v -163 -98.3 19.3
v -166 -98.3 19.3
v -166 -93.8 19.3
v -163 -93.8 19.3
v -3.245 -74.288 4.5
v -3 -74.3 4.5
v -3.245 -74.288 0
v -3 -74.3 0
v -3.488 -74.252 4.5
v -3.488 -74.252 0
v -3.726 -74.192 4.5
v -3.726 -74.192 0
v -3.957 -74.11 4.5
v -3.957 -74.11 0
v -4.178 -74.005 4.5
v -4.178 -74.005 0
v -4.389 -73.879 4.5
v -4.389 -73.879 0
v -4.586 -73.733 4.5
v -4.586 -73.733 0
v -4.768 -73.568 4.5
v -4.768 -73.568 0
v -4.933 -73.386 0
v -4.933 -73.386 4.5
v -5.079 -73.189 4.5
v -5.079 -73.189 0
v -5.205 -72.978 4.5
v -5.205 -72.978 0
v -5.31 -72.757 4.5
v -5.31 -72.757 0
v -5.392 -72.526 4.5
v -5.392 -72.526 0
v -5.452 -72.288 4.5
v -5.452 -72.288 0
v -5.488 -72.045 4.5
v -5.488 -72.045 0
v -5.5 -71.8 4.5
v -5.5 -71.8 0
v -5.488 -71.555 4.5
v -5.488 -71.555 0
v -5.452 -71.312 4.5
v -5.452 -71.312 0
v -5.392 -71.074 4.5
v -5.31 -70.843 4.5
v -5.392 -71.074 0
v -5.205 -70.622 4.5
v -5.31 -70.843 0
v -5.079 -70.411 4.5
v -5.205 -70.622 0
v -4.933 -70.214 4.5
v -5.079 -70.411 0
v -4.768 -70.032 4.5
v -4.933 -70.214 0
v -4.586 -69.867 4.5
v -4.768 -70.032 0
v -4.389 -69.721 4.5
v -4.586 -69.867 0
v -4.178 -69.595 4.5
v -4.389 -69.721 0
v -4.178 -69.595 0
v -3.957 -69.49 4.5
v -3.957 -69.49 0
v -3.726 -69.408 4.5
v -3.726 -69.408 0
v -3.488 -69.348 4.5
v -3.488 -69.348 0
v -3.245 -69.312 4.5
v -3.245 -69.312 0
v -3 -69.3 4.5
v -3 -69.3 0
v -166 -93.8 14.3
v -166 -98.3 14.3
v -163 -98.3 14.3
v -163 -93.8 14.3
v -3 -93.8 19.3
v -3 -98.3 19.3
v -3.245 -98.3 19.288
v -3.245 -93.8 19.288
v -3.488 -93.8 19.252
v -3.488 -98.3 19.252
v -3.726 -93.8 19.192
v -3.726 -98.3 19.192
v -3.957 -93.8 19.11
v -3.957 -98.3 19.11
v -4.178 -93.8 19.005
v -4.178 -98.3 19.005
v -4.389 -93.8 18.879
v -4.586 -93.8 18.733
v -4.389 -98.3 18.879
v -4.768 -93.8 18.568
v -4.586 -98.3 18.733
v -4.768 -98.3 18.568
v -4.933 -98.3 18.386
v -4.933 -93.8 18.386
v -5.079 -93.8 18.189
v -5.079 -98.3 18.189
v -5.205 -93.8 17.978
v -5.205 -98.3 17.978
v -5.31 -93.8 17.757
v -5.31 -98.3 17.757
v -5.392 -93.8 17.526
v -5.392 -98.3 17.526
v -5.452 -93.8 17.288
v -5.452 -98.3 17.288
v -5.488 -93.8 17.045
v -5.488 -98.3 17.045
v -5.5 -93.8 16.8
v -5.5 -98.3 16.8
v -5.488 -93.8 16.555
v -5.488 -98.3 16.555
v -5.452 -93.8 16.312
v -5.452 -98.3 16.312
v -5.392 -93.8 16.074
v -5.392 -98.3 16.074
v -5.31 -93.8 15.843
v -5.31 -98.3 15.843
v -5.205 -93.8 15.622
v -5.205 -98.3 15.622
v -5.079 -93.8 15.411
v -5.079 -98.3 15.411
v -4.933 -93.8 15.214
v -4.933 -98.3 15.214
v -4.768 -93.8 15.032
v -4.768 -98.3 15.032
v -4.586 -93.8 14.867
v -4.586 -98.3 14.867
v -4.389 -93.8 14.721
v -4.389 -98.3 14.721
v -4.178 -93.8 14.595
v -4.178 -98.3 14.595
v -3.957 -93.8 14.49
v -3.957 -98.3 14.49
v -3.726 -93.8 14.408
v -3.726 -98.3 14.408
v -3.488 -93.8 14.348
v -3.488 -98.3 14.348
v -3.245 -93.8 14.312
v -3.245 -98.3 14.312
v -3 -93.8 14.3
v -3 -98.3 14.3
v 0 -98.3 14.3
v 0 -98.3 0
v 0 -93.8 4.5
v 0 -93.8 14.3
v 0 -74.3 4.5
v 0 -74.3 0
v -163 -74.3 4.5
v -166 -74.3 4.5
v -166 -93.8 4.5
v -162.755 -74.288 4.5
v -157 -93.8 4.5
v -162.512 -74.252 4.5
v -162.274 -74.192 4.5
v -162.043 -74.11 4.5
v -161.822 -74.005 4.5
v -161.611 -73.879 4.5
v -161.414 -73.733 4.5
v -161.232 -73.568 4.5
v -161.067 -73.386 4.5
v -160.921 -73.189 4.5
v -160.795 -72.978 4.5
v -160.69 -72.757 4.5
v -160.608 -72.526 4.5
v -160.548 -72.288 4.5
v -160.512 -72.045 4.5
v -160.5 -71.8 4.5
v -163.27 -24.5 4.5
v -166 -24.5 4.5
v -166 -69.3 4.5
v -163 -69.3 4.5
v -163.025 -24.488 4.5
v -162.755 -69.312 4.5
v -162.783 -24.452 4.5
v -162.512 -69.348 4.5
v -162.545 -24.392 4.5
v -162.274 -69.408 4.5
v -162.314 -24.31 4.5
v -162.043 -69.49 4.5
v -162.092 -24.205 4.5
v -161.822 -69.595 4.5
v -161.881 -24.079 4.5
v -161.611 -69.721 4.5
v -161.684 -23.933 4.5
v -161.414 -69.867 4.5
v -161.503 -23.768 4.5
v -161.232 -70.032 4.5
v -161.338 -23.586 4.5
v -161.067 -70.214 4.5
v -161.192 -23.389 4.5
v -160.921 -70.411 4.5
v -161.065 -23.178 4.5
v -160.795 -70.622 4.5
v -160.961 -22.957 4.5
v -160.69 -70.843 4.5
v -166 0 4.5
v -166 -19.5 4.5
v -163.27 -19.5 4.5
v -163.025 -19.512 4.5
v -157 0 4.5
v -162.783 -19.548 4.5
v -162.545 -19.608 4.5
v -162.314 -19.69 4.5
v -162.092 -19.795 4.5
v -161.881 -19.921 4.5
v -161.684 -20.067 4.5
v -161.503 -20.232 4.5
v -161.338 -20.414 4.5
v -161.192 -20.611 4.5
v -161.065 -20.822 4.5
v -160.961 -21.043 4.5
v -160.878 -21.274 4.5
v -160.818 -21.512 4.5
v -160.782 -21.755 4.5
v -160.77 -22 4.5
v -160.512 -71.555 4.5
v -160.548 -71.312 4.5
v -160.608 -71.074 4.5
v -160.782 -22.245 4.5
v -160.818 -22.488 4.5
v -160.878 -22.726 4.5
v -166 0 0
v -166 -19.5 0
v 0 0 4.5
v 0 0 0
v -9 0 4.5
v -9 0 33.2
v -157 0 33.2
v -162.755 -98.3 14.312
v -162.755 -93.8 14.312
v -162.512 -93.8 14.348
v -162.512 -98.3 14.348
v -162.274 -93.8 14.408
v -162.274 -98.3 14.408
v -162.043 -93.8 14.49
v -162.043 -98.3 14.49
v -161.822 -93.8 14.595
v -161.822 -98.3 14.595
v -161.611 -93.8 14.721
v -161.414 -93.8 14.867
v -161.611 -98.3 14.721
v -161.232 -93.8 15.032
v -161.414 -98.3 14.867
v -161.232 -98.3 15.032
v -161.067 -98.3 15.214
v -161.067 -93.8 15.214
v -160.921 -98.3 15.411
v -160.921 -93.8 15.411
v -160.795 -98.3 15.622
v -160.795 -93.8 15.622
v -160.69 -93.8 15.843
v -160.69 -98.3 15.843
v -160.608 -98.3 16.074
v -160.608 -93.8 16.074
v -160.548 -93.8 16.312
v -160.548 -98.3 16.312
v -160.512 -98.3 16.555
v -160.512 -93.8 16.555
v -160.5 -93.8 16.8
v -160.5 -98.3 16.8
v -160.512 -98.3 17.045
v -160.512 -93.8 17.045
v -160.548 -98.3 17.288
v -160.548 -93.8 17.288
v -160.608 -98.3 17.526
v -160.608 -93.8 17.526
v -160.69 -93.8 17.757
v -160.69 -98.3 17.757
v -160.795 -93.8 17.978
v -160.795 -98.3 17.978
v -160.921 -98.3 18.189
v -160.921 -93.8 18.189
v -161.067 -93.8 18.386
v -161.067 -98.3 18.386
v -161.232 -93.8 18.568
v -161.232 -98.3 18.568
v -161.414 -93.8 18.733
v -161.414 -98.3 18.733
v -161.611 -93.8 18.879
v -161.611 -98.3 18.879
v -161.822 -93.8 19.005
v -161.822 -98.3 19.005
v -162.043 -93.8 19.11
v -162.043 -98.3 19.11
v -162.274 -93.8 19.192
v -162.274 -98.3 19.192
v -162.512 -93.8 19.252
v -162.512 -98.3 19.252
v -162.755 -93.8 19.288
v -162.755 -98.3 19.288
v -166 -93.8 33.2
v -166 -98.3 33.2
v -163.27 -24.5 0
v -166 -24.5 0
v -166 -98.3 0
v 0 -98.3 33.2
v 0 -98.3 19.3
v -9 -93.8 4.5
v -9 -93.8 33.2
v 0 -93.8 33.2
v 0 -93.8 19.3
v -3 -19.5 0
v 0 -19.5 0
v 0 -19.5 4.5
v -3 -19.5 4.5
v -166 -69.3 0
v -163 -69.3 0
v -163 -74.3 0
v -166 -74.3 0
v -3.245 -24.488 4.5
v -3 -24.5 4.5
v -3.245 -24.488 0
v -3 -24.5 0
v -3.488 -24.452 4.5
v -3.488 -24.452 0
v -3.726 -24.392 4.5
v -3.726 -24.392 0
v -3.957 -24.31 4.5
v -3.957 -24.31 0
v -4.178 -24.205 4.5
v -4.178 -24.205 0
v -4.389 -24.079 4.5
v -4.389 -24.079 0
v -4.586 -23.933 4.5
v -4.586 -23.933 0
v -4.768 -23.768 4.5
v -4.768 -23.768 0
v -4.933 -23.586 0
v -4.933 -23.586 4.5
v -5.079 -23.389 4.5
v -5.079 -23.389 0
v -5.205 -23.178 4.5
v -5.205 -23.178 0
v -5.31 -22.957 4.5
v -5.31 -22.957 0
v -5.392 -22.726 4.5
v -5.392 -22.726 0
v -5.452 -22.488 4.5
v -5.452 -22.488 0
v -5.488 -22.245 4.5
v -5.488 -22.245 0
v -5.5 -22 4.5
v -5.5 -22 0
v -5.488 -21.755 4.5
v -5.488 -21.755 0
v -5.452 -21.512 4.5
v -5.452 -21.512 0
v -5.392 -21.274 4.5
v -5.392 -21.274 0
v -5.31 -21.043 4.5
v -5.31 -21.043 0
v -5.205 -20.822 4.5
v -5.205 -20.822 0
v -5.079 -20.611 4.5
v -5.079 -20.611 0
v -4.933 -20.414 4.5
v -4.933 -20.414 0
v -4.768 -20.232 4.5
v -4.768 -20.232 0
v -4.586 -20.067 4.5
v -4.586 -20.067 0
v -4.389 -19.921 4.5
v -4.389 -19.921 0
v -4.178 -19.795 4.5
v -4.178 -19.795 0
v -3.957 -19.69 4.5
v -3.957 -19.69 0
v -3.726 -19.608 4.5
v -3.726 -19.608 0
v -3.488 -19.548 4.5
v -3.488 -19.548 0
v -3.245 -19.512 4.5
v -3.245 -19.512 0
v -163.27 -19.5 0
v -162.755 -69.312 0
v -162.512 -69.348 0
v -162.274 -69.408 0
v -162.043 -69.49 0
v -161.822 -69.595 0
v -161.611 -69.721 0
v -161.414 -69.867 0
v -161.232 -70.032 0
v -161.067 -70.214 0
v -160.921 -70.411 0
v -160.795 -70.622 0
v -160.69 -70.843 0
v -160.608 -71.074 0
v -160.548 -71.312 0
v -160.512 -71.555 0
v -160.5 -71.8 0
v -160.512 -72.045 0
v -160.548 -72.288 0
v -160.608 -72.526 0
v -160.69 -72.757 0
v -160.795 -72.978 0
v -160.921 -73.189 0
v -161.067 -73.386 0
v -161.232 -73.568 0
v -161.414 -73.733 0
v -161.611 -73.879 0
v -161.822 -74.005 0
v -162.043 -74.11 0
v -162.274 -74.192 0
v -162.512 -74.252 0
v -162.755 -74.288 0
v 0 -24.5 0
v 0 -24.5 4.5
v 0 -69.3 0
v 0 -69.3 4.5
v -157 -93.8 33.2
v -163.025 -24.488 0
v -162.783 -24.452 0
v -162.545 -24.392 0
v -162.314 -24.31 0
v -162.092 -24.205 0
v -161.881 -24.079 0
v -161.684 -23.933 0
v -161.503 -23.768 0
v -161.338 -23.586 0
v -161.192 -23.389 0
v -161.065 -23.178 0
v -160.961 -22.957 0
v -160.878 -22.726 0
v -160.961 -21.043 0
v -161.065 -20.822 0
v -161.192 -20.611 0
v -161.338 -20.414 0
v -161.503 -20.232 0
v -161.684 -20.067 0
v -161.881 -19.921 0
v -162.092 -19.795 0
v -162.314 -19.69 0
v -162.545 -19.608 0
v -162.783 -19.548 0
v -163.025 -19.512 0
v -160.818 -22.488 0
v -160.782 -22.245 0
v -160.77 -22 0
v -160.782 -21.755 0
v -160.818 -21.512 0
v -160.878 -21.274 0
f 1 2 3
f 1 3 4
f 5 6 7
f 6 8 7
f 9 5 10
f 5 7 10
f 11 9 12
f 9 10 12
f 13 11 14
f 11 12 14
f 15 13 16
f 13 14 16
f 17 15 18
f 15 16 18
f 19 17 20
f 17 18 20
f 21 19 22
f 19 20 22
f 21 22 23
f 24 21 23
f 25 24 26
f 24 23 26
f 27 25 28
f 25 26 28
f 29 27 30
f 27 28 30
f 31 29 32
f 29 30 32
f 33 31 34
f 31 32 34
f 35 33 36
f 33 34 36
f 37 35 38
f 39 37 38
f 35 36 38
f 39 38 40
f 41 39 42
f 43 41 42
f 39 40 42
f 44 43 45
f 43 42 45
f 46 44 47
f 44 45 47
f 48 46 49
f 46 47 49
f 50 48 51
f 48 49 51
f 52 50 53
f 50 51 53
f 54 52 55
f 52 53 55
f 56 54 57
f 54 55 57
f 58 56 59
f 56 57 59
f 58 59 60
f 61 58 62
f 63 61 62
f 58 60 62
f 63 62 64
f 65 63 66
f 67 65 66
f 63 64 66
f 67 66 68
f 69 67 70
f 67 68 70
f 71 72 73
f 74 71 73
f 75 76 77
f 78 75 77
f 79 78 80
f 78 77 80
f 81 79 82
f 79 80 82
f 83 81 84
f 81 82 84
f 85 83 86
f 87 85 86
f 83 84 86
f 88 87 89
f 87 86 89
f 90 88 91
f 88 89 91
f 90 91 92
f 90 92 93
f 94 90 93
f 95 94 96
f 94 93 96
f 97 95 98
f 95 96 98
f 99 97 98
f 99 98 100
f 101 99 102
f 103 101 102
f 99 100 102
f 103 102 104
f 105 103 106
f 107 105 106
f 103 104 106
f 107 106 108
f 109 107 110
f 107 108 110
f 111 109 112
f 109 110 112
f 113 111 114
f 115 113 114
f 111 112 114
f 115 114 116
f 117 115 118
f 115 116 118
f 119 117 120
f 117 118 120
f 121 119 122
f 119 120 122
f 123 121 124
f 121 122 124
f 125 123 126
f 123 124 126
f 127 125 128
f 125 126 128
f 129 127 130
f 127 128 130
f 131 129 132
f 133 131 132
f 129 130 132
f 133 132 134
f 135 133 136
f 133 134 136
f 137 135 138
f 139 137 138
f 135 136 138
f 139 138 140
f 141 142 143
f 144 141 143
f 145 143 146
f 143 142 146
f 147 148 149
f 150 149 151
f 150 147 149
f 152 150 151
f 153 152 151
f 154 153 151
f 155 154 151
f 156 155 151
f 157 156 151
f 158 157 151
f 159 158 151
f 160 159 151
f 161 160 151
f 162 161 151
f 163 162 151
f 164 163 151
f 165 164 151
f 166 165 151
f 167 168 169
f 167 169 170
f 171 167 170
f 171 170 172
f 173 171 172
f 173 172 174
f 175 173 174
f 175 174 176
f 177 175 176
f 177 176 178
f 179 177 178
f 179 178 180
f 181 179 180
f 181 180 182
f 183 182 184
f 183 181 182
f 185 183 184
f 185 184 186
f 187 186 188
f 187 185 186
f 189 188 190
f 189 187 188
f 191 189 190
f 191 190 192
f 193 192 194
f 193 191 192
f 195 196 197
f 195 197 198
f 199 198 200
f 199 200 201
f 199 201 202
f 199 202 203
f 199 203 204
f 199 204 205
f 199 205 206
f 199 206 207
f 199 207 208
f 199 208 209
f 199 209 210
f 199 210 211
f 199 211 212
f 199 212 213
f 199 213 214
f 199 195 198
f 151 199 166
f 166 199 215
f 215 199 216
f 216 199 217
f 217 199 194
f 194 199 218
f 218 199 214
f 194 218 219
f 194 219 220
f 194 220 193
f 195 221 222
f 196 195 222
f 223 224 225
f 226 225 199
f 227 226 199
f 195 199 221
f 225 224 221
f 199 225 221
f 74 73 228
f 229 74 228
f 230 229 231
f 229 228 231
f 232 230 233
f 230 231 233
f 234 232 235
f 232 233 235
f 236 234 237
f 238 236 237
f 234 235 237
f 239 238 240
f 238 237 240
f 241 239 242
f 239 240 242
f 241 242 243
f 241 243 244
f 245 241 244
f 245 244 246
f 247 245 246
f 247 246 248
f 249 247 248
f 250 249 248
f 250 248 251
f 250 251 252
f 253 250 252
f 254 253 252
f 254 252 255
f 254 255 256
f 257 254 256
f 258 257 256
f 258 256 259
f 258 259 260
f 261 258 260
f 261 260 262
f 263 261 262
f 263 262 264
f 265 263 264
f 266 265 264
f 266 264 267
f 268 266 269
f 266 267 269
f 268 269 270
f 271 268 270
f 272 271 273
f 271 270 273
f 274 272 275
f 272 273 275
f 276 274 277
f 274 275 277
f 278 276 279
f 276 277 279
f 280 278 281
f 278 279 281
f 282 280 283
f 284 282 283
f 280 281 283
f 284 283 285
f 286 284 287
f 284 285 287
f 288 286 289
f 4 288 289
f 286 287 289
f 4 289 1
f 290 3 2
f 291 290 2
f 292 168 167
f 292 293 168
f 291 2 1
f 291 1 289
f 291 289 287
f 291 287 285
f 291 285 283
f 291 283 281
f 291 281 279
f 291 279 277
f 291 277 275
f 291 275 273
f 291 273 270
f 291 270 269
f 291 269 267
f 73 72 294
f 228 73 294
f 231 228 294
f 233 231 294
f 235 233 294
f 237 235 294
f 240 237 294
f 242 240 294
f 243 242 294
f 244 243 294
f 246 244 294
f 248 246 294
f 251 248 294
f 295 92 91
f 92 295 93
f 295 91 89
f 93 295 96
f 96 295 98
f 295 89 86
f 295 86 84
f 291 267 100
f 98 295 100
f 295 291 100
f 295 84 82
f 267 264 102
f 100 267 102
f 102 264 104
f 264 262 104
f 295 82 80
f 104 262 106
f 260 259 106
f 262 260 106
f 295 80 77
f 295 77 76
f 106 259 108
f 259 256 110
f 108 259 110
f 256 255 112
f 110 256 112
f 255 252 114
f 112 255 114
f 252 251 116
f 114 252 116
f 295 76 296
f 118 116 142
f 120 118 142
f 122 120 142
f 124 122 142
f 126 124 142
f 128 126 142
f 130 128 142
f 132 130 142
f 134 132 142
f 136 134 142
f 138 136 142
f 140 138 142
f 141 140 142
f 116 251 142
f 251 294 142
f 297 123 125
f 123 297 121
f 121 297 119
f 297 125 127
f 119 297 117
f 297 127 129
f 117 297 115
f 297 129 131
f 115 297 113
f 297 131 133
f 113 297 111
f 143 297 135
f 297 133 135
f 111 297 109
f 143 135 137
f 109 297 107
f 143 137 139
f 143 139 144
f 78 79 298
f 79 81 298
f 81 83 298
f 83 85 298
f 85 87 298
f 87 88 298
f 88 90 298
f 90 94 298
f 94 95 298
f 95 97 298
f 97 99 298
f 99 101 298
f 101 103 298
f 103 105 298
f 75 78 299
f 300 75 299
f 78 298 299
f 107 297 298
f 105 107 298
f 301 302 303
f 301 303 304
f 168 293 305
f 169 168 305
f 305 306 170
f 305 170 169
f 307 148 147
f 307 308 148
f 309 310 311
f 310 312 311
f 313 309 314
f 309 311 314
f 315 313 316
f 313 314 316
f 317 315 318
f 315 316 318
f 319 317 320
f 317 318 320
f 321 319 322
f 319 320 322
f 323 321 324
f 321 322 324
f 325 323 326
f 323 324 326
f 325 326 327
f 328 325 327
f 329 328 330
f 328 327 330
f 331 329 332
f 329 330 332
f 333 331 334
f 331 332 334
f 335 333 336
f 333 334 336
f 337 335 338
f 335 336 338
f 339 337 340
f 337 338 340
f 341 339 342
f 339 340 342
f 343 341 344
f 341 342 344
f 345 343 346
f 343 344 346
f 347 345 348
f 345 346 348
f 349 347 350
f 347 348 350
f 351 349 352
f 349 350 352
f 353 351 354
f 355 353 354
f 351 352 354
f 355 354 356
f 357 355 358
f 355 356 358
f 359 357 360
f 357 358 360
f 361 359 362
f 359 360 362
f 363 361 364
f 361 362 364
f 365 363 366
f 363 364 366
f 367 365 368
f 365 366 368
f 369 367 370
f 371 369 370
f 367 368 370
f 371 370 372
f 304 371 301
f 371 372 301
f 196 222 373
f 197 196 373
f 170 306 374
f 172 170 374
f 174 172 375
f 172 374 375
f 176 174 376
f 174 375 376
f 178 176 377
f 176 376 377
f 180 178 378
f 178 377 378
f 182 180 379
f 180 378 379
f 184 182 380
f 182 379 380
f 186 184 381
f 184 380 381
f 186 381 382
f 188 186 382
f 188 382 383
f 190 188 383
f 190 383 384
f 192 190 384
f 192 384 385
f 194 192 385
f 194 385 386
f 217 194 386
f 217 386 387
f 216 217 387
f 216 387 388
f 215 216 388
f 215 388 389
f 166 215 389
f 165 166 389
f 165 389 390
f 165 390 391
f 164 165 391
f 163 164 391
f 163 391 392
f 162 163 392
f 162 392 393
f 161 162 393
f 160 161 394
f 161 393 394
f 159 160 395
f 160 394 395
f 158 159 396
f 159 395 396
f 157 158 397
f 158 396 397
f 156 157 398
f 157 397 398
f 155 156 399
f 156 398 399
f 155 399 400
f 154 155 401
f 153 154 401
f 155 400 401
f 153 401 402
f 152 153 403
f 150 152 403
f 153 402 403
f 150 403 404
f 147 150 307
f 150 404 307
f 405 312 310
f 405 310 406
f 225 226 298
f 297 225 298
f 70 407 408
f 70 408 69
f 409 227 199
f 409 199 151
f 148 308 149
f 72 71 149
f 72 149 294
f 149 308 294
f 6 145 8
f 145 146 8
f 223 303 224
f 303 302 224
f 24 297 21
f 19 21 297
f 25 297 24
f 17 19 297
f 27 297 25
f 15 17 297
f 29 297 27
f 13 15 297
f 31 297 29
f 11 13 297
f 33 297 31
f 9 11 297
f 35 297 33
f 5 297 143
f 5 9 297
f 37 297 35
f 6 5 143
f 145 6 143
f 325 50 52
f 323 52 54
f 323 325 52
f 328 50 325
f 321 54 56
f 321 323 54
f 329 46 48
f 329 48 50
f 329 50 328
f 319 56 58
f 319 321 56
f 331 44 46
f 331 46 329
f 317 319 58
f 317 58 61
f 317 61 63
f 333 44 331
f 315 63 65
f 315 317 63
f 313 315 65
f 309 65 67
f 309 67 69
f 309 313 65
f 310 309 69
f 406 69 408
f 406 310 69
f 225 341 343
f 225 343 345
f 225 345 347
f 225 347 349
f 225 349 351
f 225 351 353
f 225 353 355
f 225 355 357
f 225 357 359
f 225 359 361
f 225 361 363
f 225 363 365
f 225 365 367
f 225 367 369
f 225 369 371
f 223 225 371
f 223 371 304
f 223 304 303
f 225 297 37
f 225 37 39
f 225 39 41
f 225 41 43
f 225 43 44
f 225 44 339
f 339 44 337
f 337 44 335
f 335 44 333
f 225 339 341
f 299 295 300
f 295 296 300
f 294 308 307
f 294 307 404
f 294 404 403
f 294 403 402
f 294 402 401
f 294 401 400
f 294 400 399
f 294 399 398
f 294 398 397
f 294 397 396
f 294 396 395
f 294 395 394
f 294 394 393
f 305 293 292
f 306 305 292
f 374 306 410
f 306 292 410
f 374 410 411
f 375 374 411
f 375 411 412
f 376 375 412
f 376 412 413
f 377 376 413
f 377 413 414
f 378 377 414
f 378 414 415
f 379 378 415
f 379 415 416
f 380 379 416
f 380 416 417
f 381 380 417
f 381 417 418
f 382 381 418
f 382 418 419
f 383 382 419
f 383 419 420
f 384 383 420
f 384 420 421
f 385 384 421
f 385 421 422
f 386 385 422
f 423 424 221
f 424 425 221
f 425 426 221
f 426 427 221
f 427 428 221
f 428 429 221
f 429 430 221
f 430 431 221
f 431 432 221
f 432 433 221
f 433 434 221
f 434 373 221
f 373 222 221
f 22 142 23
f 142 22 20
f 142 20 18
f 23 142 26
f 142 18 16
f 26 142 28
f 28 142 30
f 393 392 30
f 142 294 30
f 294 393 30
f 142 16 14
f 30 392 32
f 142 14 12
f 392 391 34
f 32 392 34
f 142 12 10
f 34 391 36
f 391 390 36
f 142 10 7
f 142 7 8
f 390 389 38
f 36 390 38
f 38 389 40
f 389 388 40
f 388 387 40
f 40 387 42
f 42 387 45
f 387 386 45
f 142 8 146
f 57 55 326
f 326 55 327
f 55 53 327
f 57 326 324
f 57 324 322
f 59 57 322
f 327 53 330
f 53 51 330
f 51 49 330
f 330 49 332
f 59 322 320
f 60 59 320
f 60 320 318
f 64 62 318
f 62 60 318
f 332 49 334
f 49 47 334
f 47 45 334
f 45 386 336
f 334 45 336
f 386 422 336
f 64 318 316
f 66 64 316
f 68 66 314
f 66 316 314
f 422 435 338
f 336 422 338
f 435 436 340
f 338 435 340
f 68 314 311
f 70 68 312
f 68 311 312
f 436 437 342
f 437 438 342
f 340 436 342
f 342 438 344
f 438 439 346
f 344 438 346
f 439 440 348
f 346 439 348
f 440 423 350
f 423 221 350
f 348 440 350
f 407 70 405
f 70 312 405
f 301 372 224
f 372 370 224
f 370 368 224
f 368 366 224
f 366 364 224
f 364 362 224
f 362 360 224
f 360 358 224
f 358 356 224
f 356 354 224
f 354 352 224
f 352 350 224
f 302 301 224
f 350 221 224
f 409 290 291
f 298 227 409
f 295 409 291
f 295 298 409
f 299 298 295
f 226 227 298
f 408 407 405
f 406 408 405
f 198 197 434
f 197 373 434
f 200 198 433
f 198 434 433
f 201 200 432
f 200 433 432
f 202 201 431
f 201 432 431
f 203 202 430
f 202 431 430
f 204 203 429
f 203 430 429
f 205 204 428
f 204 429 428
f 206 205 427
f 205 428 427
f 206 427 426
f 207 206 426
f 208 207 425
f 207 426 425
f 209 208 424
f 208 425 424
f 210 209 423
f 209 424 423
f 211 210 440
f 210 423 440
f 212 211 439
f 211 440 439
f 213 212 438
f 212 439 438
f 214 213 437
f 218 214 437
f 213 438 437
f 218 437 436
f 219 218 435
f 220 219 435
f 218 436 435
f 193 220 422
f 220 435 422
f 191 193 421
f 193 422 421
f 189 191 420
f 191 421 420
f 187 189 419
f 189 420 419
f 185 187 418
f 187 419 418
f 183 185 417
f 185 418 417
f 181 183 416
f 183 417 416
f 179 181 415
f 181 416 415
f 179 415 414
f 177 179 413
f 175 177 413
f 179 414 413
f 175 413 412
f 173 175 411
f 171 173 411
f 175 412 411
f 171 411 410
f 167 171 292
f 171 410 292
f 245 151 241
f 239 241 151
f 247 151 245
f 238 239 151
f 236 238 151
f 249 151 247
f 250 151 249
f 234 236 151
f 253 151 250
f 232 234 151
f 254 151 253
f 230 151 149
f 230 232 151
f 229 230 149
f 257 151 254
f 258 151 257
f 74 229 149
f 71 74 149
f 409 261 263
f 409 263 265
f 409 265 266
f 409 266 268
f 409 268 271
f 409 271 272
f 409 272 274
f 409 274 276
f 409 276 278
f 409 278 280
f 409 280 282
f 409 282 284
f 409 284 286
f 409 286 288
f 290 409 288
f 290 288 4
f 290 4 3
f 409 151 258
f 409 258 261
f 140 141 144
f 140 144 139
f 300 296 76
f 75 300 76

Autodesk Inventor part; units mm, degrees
ref_plane "YZ Plane" through (0, 0, 0) normal (1, 0, 0) x (0, 1, 0)
ref_plane "XZ Plane" through (0, 0, 0) normal (0, 1, 0) x (-1, 0, 0)
ref_plane "XY Plane" through (0, 0, 0) normal (0, 0, 1) x (1, 0, 0)
sketch "Sketch1" plane through (0, 0, 0) normal (0, 0, 1) x (1, 0, 0)
  point P0 (0, 0)
sketch "Sketch2" plane through (0, 0, 0) normal (0, 0, 1) x (1, 0, 0)
  line L0 (0, 0) -> (-166, 0)
  line L1 (-166, -98.3) -> (0, -98.3)
  line L2 (0, 0) -> (-163, 0)
  line L3 (0, -19.5) -> (0, 0)
  line L4 (-3, 0) -> (0, 0)
  line L5 (0, 0) -> (0, -19.5)
  line L6 (-166, -19.5) -> (-163, -19.5)
  line L7 (-166, -24.5) -> (-163, -24.5)
  line L8 (-166, -98.3) -> (-3, -98.3)
  line L9 (-166, -74.3) -> (-166, -98.3)
  line L10 (-163, -98.3) -> (-166, -98.3)
  line L11 (-166, -98.3) -> (-166, -74.3)
  line L12 (-163, -69.3) -> (-166, -69.3)
  line L13 (-166, -74.3) -> (-163, -74.3)
  arc A0 (-163, -74.3) -> (-163, -69.3) centre (-163, -71.8) ccw
  line L14 (-166, -74.3) -> (-166, -98.3)
  line L15 (-166, 0) -> (-166, -19.5)
  line L16 (-166, -24.5) -> (-166, -69.3)
  line L17 (0, -69.3) -> (-3, -69.3)
  line L18 (-3, -69.3) -> (0, -69.3)
  line L19 (0, -74.3) -> (-3, -74.3)
  arc A1 (-3, -69.3) -> (-3, -74.3) centre (-3, -71.8) ccw
  arc A2 (-163.2703, -24.5) -> (-163.2703, -19.5) centre (-163.2703, -22) ccw
  line L20 (0, -98.3) -> (0, -74.3)
  line L21 (-163.2703, -19.5) -> (-163, -19.5)
  line L22 (-163, -24.5) -> (-163.2703, -24.5)
  line L23 (0, -19.5) -> (-3, -19.5)
  line L24 (-3, -24.5) -> (0, -24.5)
  arc A3 (-3, -19.5) -> (-3, -24.5) centre (-3, -22) ccw
  line L25 (-3.2703, -19.5) -> (-3.2703, -19.5147)
  line L26 (-3.2703, -24.4853) -> (-3.2703, -24.5)
  line L27 (0, -69.3) -> (0, -24.5)
  line L28 (0, -19.5) -> (0, 0)
  dimension "d19" = 160
  dimension "d21" = 49.8
extrude "Extrusion1" add sketch "Sketch2" along normal blind 33.2
sketch "Sketch3" plane through (0, 0, 33.2) normal (0, 0, 1) x (1, 0, 0)
  line L0 (-9, 0) -> (-9, -93.8)
  line L1 (-166, -93.8) -> (-166, 0)
  line L2 (-157, 0) -> (-157, -93.8)
  line L3 (-9, -93.8) -> (-9, 0)
  line L4 (-9, -93.8) -> (0, -93.8)
  line L5 (0, -93.8) -> (0, 0)
  line L6 (0, 0) -> (-9, 0)
  line L7 (-9, 0) -> (-9, -93.8)
  line L8 (-166, 0) -> (-166, -19.5) projected
  line L9 (-166, 0) -> (-157, 0)
  line L10 (-157, 0) -> (-157, -93.8)
  line L11 (-157, -93.8) -> (-166, -93.8)
  line L12 (-166, -93.8) -> (-166, 0)
  dimension "d24" = 157
  dimension "d25" = 93.8
  dimension "d26" = 148
extrude "Extrusion2" cut sketch "Sketch3" against normal blind 28.7
sketch "Sketch4" plane through (-166, -98.3, 0) normal (0, -1, 0) x (1, 0, 0)
  line L0 (166, 33.2) -> (163, 33.2)
  line L1 (166, 19.3) -> (166, 33.2)
  line L2 (166, 0) -> (166, 33.2) projected
  line L3 (166, 19.3) -> (163, 19.3)
  line L4 (166, 14.3) -> (163, 14.3)
  arc A0 (163, 19.3) -> (163, 14.3) centre (163, 16.8) ccw
  line L5 (0, 33.2) -> (166, 33.2) projected
  line L6 (0, 33.2) -> (3, 33.2)
  line L7 (0, 14.3) -> (3, 14.3)
  line L8 (0, 19.3) -> (3, 19.3)
  arc A1 (3, 14.3) -> (3, 19.3) centre (3, 16.8) ccw
  line L9 (0, 19.3) -> (0, 14.3)
  line L10 (0, 0) -> (0, 33.2) projected
extrude "Extrusion3" cut sketch "Sketch4" against normal blind 28.7
properties part number "Complete Driver"
